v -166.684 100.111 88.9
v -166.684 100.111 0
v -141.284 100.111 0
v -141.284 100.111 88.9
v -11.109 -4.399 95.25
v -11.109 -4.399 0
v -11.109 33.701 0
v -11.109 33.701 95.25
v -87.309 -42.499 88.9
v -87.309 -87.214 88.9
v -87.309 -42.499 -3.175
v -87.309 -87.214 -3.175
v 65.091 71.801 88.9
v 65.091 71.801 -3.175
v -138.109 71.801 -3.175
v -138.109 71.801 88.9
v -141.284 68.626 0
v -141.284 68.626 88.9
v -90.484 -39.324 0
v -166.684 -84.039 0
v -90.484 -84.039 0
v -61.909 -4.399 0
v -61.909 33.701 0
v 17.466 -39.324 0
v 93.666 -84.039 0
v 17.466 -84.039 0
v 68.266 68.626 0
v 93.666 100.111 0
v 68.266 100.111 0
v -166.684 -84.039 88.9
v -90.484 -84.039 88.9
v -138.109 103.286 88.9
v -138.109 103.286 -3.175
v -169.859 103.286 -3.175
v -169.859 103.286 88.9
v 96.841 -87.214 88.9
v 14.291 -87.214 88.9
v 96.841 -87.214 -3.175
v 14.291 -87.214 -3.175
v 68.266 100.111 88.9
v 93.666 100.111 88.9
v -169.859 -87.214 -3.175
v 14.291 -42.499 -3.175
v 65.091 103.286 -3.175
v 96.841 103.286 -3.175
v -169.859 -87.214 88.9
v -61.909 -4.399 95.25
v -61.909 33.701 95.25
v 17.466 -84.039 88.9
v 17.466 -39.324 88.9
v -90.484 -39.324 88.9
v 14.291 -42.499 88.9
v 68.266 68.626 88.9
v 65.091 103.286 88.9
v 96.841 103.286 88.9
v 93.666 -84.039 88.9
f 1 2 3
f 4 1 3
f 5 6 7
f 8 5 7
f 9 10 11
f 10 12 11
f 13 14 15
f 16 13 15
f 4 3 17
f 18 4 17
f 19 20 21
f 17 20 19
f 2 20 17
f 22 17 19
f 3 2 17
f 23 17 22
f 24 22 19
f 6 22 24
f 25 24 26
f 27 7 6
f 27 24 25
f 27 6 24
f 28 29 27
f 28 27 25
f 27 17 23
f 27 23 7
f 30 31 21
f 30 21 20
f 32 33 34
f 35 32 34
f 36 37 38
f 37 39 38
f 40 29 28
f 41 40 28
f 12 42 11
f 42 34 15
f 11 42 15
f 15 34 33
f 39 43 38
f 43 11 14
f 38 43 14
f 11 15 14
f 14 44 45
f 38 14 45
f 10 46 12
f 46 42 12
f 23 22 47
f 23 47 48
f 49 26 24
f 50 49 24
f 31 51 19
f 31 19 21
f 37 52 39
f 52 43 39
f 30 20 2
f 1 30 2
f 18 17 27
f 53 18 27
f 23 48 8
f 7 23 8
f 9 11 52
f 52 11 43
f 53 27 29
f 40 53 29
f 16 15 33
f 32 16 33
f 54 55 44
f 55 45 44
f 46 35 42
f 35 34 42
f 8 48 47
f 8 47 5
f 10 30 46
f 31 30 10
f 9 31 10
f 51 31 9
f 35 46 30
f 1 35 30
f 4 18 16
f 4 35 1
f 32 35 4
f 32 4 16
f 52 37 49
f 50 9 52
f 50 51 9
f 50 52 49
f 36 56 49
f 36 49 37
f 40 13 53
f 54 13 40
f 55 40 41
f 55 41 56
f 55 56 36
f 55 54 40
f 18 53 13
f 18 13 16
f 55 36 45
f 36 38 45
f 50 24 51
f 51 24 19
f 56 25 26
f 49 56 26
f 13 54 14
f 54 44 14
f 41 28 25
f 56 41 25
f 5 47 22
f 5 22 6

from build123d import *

# Parameters (mm, degrees)
F1_DEPTH = 3.175
F3_DEPTH = 88.9
F4_W     = 50.8
F4_H     = 38.1
F5_DEPTH = 95.25


with BuildPart() as f1:
    # F0 (on Top) → F1 (new body)
    with BuildSketch(Plane.XY):
        Polygon((-138.109116, 103.285787), (-169.859116, 103.285787), (-169.859116, -87.214213), (-87.309116, -87.214213), (-87.309116, -42.498762), (14.290884, -42.498762), (14.290884, -87.214213), (96.840884, -87.214213), (96.840884, 103.285787), (65.090884, 103.285787), (65.090884, 71.801238), (-138.109116, 71.801238), align=None)
    extrude(amount=-F1_DEPTH)

    # F2 (on face) → F3 (join)
    with BuildSketch(Plane.XY):
        Polygon((-138.109116, 103.285787), (-169.859116, 103.285787), (-169.859116, -87.214213), (-87.309116, -87.214213), (-87.309116, -42.498762), (14.290884, -42.498762), (14.290884, -87.214213), (96.840884, -87.214213), (96.840884, 103.285787), (65.090884, 103.285787), (65.090884, 71.801238), (-138.109116, 71.801238), align=None)
        Polygon((-166.684116, -84.039213), (-166.684116, 100.110787), (-141.284116, 100.110787), (-141.284116, 68.626238), (68.265884, 68.626238), (68.265884, 100.110787), (93.665884, 100.110787), (93.665884, -84.039213), (40.343958, -84.039213), (17.465884, -84.039213), (17.465884, -39.323762), (-90.484116, -39.323762), (-90.484116, -84.039213), (-116.960541, -84.039213), align=None, mode=Mode.SUBTRACT)
    extrude(amount=F3_DEPTH)

    # F4 (on face) → F5 (join)
    with BuildSketch(Plane.XY):
        with Locations((-36.509116, 14.651238)):
            Rectangle(F4_W, F4_H)
    extrude(amount=F5_DEPTH)


solid = f1.part
